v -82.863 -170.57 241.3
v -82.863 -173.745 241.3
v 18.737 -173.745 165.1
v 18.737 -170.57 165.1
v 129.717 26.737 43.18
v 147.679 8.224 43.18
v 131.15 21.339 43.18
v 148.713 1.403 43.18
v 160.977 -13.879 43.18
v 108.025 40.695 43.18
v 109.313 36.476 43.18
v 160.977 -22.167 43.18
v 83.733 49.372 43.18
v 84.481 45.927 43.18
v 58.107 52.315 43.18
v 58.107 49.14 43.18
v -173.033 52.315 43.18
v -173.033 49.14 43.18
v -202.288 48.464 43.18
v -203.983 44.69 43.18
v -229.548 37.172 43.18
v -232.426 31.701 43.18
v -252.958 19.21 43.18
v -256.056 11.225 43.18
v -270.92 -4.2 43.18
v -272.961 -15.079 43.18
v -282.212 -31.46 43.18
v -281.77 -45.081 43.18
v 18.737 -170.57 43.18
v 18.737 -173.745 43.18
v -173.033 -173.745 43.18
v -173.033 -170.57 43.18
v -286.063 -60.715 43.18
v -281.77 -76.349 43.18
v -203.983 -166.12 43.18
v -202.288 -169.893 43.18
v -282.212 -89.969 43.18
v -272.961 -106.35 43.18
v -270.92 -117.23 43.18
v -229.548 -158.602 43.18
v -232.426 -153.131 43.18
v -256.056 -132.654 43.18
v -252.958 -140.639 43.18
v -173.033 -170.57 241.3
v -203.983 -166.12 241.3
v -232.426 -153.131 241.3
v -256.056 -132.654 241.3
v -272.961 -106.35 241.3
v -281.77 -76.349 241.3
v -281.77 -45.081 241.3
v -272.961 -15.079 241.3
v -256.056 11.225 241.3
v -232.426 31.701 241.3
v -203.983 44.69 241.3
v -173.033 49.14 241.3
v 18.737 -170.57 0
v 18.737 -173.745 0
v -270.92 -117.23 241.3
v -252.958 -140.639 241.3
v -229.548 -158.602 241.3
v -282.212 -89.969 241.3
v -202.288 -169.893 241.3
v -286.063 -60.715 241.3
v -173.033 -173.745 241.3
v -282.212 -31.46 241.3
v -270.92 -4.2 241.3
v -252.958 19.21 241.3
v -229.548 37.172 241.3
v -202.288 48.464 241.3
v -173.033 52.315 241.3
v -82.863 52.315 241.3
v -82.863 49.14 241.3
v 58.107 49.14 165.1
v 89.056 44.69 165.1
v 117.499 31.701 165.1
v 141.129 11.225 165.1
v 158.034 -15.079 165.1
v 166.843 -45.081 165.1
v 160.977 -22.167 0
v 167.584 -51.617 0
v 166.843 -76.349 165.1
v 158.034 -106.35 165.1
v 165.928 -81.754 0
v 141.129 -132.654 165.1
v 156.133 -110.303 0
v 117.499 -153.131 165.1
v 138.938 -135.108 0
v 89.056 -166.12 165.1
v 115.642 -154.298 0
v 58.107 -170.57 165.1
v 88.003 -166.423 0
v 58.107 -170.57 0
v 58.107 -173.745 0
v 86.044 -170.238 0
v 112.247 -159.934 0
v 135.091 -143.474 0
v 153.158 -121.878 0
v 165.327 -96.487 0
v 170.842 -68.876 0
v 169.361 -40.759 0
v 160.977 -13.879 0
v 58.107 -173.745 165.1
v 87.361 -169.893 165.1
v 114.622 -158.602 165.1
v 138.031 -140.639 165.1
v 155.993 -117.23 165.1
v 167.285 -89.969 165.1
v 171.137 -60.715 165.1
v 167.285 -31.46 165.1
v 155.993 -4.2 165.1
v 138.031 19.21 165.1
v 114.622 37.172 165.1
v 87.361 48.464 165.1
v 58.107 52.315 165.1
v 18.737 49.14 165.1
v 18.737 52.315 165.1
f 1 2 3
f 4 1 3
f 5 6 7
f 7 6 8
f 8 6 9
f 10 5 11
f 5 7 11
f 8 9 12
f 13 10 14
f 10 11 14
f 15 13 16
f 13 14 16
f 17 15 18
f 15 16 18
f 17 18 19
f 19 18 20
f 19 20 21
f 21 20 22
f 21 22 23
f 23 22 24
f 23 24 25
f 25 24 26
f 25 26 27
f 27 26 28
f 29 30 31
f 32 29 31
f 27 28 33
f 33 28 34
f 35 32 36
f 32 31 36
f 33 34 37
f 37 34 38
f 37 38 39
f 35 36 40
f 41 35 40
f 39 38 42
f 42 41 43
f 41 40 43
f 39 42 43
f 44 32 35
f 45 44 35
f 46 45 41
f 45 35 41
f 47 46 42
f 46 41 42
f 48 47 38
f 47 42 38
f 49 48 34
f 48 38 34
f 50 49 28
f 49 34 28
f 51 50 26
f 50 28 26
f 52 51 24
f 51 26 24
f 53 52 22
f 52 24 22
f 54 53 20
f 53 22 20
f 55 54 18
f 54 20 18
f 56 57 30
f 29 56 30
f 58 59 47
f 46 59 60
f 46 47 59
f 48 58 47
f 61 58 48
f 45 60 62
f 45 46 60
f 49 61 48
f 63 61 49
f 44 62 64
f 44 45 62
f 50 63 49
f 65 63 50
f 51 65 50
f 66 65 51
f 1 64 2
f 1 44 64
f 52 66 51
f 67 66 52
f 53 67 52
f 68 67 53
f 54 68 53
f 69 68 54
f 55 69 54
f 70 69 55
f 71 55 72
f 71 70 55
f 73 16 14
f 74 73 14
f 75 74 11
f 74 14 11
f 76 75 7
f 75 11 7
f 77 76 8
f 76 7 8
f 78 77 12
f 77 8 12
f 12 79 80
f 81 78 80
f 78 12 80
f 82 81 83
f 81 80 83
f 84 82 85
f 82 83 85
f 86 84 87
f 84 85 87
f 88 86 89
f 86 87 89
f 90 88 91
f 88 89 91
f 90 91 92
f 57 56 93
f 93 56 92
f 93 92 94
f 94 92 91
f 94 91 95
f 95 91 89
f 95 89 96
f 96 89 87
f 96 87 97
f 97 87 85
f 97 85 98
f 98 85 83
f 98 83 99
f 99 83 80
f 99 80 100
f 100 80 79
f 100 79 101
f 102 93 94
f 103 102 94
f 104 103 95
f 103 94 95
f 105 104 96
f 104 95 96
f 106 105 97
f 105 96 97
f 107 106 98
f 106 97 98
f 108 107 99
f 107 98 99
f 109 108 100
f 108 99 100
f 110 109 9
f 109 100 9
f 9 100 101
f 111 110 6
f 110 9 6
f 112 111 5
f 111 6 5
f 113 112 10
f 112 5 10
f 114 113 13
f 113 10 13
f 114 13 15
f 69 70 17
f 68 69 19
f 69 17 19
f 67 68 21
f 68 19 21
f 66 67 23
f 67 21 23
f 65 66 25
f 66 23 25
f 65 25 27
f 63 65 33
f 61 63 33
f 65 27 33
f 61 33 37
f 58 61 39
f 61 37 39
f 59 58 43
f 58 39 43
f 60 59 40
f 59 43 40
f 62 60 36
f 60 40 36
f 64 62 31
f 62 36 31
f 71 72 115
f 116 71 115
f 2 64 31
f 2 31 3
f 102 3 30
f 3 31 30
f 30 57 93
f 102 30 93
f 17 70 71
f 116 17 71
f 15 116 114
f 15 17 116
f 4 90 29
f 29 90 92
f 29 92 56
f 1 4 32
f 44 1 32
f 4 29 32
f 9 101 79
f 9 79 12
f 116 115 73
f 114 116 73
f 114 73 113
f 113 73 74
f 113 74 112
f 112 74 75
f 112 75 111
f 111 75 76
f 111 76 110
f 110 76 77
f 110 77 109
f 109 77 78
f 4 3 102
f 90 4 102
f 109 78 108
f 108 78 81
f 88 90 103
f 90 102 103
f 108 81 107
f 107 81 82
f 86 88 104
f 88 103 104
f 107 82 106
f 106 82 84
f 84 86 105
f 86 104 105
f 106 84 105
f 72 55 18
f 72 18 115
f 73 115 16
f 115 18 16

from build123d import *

# Parameters (mm, degrees)
F0_W     = 231.14
F0_H     = 226.06
F1_DEPTH = 241.3
F2_W     = 113.03
F2_H     = 76.2
F2_W_2   = 39.37
F2_W_3   = 150.0068409762
F2_H_2   = 43.18
F2_W_4   = 191.77
F3_DEPTH = 226.061
F6_DEPTH = 241.301
F4_W     = 102.87
F4_H     = 43.18
F4_W_2   = 39.37
F7_DEPTH = 114.046


# Not quite as in the source:
# - a feature names something its author has since deleted; it is built from what else it names


with BuildPart() as f1:
    # F0 (on Top) → F1 (new body)
    with BuildSketch(Plane.XY):
        with BuildLine():
            Line((-173.0334059873, -173.7446556775), (-173.0334059873, 52.3153443225))
            ThreePointArc((-173.0334059873, 52.3153443225), (-286.0634059873, -60.7146556775), (-173.0334059873, -173.7446556775))
        make_face()
        with Locations((-57.4634059873, -60.7146556775)):
            Rectangle(F0_W, F0_H)
        with BuildLine():
            ThreePointArc((58.1065940127, -173.7446556775), (171.1365940127, -60.7146556775), (58.1065940127, 52.3153443225))
            Line((58.1065940127, 52.3153443225), (58.1065940127, -173.7446556775))
        make_face()
    extrude(amount=F1_DEPTH)

    # F2 (on face) → F3 (cut, through all)
    with BuildSketch(Plane.XZ.offset(173.7446556775)):
        Polygon((18.7365940127, 241.3), (-82.8634059873, 241.3), (18.7365940127, 165.1), align=None)
        with Locations((114.6215940127, 203.2)):
            Rectangle(F2_W, F2_H)
        with Locations((38.4215940127, 203.2)):
            Rectangle(F2_W_2, F2_H)
        with Locations((-248.0368264754, 21.59)):
            Rectangle(F2_W_3, F2_H_2)
        with Locations((-77.1484059873, 21.59)):
            Rectangle(F2_W_4, F2_H_2)
    extrude(amount=-F3_DEPTH, mode=Mode.SUBTRACT)

    # F5 (on face) → F6 (cut, through all)
    with BuildSketch(Plane(origin=(0, 0, 0), x_dir=(1, 0, 0), z_dir=(0, 0, -1))):
        with BuildLine():
            ThreePointArc((-173.0334059873, 170.5696556775), (-282.8884059873, 60.7146556775), (-173.0334059873, -49.1403443225))
            Line((-173.0334059873, -49.1403443225), (3.4965941633, -49.1403443225))
            Line((3.4965941633, -49.1403443225), (18.7365940127, -49.1403443225))
            Line((18.7365940127, -49.1403443225), (18.7365940127, 170.5696556775))
            Line((18.7365940127, 170.5696556775), (3.4965941633, 170.5696556775))
            Line((3.4965941633, 170.5696556775), (-173.0334059873, 170.5696556775))
        make_face()
        with BuildLine():
            Line((18.7365940127, 170.5696556775), (18.7365940127, -49.1403443225))
            Line((18.7365940127, -49.1403443225), (21.9115940127, -49.1403443225))
            Line((21.9115940127, -49.1403443225), (58.1065940127, -49.1403443225))
            ThreePointArc((58.1065940127, -49.1403443225), (167.9615940127, 60.7146556775), (58.1065940127, 170.5696556775))
            Line((58.1065940127, 170.5696556775), (21.9115940127, 170.5696556775))
            Line((21.9115940127, 170.5696556775), (18.7365940127, 170.5696556775))
        make_face()
    extrude(amount=-F6_DEPTH, mode=Mode.SUBTRACT)

    # F4 (on face) → F7 (cut)
    with BuildSketch(Plane(origin=(0, 52.3153443225, 0), x_dir=(-1, 0, 0), z_dir=(0, 1, 0))):
        with Locations((-109.5415940127, 21.59)):
            Rectangle(F4_W, F4_H)
        with Locations((-38.4215940127, 21.59)):
            Rectangle(F4_W_2, F4_H)
    extrude(amount=-F7_DEPTH, mode=Mode.SUBTRACT)


solid = f1.part
